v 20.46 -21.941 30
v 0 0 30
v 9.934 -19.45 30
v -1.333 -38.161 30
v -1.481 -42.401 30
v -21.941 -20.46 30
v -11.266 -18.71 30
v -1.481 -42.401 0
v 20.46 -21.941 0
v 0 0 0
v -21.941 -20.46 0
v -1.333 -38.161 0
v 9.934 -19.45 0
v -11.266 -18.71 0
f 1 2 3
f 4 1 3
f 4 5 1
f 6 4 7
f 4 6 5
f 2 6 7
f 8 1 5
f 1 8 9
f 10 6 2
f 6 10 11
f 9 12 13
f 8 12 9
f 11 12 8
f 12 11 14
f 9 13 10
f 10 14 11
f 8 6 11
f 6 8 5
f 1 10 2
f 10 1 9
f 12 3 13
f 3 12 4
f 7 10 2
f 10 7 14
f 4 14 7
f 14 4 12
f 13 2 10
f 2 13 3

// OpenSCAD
rotate([0,0,178])
rotate([0,-90,0]){
    difference(){
        rotate([-45,0,0]) {
            cube([30, 30, 30]);
        }
        scale([1,0.9,0.5]) {
            rotate([-45,0,0]) {
                cube([30, 30, 30]);
            }
        }
    }
}
